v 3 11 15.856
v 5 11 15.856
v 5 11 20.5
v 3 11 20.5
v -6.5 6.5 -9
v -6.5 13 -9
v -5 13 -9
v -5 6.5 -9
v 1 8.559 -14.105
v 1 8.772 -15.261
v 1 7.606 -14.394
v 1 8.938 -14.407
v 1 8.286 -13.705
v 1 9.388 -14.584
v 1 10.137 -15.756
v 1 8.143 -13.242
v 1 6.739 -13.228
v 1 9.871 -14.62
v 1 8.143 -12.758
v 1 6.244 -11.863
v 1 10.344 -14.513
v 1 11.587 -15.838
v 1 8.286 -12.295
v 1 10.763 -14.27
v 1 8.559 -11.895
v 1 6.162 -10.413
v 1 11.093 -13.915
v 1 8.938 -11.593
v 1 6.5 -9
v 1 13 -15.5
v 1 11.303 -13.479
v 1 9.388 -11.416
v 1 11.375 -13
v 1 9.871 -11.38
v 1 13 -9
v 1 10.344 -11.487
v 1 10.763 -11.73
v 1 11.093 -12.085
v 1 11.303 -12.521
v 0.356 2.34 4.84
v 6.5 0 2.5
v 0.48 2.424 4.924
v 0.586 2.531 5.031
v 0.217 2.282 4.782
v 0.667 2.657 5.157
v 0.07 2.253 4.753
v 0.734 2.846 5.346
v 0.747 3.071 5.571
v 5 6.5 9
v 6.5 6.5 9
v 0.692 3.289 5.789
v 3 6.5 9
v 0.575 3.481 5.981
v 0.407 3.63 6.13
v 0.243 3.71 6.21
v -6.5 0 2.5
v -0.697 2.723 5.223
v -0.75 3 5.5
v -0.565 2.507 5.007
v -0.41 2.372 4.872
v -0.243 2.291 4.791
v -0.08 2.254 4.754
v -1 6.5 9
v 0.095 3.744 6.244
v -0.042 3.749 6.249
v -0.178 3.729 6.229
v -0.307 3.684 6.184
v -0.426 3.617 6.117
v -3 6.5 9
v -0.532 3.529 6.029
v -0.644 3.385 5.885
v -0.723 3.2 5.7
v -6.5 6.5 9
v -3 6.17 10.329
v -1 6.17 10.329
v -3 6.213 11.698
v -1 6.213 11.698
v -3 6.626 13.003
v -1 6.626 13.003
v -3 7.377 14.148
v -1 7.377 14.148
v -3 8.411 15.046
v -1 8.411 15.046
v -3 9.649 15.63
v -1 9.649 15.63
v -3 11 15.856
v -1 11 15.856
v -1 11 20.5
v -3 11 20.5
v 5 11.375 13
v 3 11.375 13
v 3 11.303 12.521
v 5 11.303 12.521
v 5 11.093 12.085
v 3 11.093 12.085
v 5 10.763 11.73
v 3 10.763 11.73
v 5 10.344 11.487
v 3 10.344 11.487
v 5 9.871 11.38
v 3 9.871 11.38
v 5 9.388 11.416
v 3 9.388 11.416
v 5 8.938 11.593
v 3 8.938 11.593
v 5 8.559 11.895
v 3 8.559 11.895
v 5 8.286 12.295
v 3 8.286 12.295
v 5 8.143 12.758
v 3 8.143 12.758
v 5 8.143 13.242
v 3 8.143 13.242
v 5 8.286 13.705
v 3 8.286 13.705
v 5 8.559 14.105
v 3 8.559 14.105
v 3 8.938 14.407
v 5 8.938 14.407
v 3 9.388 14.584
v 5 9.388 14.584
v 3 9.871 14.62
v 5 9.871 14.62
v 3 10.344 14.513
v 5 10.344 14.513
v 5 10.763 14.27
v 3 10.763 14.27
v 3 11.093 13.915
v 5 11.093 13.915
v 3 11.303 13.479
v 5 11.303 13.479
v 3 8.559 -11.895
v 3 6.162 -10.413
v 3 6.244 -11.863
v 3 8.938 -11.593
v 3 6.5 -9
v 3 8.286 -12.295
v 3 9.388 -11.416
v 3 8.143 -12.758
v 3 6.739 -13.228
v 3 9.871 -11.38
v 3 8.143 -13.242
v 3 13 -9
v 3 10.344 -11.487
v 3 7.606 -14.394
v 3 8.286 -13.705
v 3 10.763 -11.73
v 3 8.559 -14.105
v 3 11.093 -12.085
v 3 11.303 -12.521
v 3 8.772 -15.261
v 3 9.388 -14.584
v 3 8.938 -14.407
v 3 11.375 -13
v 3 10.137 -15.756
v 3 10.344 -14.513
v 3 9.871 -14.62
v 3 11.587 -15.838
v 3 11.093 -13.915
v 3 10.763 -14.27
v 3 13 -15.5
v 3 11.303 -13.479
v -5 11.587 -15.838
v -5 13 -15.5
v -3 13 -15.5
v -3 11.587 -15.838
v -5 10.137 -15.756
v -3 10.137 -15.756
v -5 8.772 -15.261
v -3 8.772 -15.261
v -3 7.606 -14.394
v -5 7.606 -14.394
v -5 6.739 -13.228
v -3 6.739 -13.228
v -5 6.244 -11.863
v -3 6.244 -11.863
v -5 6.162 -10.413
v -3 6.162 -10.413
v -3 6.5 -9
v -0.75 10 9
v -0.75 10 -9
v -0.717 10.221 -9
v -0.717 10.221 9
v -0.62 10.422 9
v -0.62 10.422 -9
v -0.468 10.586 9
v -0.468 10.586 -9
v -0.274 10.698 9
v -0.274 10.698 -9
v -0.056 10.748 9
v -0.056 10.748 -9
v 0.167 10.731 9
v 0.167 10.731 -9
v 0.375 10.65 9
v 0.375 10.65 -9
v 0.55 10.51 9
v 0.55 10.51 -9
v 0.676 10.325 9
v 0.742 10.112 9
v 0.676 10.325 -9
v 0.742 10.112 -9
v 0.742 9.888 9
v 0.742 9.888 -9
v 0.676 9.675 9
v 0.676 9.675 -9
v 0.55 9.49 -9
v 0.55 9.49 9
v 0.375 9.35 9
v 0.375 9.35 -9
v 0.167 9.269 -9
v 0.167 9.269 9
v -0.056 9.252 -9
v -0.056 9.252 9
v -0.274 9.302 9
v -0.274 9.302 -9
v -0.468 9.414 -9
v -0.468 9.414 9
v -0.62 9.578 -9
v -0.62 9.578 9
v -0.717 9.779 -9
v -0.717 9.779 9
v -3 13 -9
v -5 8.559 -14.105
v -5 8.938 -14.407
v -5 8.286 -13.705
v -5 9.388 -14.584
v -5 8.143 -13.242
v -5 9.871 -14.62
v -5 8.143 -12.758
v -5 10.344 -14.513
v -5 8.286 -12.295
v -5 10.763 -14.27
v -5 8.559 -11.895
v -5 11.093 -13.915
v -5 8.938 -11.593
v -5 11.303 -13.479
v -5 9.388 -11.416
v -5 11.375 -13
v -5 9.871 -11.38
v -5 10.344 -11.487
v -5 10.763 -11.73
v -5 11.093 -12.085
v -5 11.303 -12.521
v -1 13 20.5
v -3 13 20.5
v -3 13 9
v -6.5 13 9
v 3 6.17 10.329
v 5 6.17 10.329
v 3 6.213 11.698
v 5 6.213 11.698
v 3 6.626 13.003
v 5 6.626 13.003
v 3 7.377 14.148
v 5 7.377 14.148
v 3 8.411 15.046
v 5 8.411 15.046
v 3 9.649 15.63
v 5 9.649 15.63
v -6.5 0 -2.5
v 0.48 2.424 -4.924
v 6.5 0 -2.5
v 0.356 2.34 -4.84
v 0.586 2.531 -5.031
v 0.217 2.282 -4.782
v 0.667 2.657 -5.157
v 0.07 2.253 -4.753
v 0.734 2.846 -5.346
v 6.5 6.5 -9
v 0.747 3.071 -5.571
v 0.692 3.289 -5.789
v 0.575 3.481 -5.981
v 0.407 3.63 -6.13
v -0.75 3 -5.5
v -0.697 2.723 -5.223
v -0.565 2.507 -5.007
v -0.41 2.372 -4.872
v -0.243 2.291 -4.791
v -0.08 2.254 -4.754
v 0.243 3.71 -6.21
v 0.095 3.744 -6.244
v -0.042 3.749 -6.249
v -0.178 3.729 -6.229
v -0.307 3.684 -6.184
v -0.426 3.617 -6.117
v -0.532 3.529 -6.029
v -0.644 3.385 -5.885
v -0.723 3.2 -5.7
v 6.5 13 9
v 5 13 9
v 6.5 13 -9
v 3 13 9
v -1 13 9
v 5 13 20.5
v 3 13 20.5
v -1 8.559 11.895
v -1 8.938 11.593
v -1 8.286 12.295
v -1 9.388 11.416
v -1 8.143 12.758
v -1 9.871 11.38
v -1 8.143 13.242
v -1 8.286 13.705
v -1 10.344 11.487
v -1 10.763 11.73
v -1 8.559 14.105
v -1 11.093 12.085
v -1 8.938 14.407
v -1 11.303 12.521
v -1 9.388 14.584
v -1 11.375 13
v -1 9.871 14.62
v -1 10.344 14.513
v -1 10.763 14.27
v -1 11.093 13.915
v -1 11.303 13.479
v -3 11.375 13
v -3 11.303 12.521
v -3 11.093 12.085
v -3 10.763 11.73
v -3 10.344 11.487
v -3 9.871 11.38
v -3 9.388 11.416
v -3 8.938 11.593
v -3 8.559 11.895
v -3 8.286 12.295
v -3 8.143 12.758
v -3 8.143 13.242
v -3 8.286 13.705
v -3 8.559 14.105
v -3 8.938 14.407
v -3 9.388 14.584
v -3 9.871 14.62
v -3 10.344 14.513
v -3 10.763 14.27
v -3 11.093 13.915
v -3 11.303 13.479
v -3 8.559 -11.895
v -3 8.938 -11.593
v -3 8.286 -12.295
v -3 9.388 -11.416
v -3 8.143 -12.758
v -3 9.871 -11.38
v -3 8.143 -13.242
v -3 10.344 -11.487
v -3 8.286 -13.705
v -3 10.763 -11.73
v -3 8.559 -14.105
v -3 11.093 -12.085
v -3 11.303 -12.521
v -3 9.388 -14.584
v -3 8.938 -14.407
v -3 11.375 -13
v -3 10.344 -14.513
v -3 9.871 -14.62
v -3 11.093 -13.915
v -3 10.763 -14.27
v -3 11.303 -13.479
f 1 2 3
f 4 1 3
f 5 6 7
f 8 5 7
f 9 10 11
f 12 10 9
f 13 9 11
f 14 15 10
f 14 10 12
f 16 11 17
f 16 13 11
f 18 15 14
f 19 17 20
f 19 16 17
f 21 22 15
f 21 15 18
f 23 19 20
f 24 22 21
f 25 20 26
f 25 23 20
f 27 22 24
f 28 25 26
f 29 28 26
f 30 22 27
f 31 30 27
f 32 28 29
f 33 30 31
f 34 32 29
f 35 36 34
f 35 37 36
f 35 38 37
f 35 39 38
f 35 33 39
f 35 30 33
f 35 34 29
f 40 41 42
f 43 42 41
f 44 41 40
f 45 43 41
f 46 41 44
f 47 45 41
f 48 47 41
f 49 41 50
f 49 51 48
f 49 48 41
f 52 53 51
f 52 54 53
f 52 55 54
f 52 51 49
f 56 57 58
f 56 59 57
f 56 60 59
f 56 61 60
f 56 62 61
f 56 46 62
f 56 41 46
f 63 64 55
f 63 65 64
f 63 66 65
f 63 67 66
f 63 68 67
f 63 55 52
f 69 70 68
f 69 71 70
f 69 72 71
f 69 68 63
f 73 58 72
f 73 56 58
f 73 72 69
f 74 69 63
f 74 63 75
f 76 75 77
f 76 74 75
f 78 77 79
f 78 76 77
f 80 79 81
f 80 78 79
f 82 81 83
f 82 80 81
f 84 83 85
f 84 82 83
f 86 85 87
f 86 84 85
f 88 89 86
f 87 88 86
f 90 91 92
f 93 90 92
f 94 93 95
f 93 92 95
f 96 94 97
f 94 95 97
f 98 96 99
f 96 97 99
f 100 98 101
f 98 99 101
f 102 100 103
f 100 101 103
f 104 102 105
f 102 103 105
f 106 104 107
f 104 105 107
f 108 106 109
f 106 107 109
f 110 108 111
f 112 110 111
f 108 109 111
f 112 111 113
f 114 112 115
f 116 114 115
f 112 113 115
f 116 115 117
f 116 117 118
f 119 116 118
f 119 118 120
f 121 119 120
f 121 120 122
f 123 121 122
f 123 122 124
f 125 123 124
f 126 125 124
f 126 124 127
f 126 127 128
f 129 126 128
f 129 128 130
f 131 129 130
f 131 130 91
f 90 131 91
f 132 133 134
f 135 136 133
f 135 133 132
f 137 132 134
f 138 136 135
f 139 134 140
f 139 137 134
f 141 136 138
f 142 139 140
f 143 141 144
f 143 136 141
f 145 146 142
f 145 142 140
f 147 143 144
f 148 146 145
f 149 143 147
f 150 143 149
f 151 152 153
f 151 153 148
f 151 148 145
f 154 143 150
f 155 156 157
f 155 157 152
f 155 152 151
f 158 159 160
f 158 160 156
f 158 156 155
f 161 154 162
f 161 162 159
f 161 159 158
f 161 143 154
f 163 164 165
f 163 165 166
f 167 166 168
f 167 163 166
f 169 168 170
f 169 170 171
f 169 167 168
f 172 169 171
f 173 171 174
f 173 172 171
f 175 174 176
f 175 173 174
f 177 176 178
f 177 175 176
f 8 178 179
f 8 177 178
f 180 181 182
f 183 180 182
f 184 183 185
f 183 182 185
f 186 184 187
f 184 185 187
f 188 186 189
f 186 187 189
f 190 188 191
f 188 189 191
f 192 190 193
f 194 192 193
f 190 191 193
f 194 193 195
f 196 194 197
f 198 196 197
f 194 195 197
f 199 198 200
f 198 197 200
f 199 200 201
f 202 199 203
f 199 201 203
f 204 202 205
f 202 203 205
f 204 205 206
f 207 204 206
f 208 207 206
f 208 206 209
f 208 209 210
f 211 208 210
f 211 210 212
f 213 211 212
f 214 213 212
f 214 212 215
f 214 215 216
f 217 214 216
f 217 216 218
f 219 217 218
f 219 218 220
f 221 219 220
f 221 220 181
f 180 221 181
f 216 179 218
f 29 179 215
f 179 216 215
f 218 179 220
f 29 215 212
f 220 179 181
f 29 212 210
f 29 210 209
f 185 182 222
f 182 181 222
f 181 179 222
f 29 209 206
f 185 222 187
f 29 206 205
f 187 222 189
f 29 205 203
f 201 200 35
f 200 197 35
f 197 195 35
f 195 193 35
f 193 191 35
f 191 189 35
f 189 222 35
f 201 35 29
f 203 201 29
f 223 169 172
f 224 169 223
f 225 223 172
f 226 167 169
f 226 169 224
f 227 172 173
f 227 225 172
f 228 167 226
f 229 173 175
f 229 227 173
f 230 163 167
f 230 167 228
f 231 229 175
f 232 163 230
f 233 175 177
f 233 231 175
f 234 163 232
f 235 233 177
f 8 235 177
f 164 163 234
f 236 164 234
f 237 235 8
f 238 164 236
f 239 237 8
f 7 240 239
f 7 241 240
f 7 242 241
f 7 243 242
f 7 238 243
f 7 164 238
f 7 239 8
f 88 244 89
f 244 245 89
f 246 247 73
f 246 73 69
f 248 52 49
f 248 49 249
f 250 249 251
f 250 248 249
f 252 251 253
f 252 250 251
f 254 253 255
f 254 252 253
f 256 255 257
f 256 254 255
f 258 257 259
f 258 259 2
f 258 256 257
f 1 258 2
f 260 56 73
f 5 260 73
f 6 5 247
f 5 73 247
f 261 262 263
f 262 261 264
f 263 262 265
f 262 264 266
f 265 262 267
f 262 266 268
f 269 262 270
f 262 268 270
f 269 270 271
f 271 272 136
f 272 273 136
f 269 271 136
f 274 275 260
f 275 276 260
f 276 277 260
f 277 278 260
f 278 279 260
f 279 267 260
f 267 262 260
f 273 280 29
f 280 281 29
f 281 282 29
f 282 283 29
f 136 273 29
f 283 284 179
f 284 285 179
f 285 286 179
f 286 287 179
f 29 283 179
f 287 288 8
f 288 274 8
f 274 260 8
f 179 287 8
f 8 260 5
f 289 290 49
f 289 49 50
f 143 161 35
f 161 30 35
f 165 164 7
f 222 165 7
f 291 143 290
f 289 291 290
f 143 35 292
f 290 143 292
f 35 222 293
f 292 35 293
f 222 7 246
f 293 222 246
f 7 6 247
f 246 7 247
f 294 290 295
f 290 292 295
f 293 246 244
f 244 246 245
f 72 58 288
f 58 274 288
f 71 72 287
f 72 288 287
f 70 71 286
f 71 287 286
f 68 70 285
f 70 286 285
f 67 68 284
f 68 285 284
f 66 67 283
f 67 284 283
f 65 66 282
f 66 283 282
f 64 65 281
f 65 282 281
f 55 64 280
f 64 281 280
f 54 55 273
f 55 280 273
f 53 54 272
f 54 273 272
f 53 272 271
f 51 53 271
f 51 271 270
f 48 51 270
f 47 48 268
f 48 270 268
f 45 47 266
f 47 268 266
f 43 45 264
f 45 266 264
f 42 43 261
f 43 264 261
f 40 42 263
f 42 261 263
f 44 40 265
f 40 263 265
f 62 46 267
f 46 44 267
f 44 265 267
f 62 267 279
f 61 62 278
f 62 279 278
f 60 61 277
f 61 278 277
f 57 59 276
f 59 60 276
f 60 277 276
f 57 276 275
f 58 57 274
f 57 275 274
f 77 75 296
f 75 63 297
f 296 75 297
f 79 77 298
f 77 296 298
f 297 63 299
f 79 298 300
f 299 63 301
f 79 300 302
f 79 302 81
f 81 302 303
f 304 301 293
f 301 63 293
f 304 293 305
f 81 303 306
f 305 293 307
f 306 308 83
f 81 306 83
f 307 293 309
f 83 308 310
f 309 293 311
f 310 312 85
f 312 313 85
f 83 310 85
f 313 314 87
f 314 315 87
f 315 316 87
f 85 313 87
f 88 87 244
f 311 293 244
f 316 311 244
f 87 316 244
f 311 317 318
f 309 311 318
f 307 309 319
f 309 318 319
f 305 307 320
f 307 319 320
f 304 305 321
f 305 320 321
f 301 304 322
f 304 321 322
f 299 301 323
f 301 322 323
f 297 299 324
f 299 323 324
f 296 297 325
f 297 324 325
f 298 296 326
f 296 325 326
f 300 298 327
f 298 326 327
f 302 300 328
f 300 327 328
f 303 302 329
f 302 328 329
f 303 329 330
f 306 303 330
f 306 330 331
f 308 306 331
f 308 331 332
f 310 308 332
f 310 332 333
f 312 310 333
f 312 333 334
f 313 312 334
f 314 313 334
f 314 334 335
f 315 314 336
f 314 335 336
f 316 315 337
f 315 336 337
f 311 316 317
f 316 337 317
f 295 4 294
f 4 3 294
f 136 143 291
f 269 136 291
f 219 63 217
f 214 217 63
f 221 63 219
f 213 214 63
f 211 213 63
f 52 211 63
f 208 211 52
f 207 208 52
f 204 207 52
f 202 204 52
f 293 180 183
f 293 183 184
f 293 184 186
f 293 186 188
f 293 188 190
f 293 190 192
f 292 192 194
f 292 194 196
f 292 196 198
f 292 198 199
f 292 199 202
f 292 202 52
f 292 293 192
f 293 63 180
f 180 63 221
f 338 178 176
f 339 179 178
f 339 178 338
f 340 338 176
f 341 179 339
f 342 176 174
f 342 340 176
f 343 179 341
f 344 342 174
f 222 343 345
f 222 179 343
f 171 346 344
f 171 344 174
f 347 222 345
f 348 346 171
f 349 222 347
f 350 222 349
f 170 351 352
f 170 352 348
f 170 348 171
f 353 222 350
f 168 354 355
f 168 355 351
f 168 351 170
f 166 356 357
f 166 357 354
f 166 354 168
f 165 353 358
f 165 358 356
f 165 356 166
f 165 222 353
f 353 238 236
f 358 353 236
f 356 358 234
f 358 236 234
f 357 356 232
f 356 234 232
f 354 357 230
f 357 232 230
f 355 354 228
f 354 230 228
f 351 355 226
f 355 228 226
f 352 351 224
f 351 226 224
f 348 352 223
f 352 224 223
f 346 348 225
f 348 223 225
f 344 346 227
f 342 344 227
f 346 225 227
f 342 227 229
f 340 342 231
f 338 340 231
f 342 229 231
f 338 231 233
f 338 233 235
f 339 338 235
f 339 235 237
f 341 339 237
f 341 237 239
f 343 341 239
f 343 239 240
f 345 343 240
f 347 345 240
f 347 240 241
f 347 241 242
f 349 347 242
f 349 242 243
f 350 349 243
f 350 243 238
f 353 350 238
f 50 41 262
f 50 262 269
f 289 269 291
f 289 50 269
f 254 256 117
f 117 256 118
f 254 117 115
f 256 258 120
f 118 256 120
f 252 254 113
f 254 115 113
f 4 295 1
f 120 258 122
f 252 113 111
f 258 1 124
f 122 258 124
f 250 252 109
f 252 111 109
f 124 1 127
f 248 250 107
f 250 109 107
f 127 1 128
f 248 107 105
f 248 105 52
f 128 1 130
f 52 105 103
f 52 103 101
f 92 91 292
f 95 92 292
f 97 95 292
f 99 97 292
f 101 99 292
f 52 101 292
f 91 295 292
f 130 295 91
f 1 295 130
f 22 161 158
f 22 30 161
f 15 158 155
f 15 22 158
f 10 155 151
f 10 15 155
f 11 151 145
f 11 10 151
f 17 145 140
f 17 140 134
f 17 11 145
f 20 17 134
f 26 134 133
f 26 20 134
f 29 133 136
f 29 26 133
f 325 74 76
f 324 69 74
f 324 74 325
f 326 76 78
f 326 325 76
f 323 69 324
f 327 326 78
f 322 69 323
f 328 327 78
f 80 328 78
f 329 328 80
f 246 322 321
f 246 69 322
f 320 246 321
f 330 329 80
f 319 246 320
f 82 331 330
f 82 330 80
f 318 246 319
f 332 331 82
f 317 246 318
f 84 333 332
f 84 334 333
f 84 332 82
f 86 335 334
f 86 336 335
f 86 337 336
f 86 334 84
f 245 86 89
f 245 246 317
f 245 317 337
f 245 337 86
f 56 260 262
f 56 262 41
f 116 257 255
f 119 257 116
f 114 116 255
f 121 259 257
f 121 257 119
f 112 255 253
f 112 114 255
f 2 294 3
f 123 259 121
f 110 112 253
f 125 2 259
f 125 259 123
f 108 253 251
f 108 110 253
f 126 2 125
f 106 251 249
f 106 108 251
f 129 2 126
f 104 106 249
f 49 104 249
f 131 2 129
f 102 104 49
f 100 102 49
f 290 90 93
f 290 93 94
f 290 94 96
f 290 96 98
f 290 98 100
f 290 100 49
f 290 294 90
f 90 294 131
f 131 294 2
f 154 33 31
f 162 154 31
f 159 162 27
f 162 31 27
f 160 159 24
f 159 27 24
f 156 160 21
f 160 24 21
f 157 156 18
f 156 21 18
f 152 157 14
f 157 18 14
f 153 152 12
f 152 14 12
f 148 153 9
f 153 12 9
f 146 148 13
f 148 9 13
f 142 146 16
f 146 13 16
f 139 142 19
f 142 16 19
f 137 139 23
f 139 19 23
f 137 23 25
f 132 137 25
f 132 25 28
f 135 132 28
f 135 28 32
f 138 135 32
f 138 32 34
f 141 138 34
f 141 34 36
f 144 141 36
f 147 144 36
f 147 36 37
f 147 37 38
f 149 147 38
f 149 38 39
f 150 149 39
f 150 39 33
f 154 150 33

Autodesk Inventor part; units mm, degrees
ref_plane "YZ Plane" through (0, 0, 0) normal (1, 0, 0) x (0, 1, 0)
ref_plane "XZ Plane" through (0, 0, 0) normal (0, 1, 0) x (-1, 0, 0)
ref_plane "XY Plane" through (0, 0, 0) normal (0, 0, 1) x (1, 0, 0)
sketch "Sketch7" plane through (0, 0, 0) normal (1, 0, 0) x (0, 1, 0)
  line L0 (-2.6, 0) -> (15.6, 0) projected
  line L1 (0, -24.701) -> (0, 24.701) projected
  line L2 (0, 2.5) -> (0, -2.5)
  line L3 (13, 15.5) -> (13, 0)
  line L4 (0, 2.5) -> (6.5, 9)
  line L5 (0, 2.5) -> (9.1924, 2.5) construction
  arc A0 (13, 15.5) -> (6.5, 9) centre (11.1419, 10.8581) ccw
  circle A1 centre (9.75, 13) radius 1.625
  line L6 (13, -15.5) -> (13, 0)
  line L7 (0, -2.5) -> (6.5, -9)
  arc A2 (6.5, -9) -> (13, -15.5) centre (11.1419, -10.8581) ccw
  circle A3 centre (9.75, -13) radius 1.625
  point P0 (0, 0)
  dimension "d64" = 5
  dimension "d65" = 2.5
  dimension "d66" = 45
  dimension "d67" = 6.5
  dimension "d68" = 13
  dimension "d69" = 15.5
  dimension "d70" = 5
  dimension "d71" = 3.25
  dimension "d74" = 3.25
  dimension "d103" = 2.5
extrude "Extrusion5" add sketch "Sketch7" along normal mid plane 13
sketch "Sketch8" plane through (-6.5, 13, 15.5) normal (0, 1, 0) x (1, 0, 0)
  line L0 (0, 6.5) -> (13, 6.5) projected
  line L1 (11.5, 6.5) -> (13, 6.5)
  line L2 (13, 6.5) -> (13, -0.5)
  line L3 (13, -0.5) -> (11.5, -0.5)
  line L4 (11.5, -0.5) -> (11.5, 6.5)
  line L5 (13, 31) -> (13, 0) projected
  line L6 (5.5, 6.5) -> (9.5, 6.5)
  line L7 (9.5, 6.5) -> (9.5, -0.5)
  line L8 (9.5, -0.5) -> (5.5, -0.5)
  line L9 (5.5, -0.5) -> (5.5, 6.5)
  line L10 (0, 6.5) -> (3.5, 6.5)
  line L11 (3.5, 6.5) -> (3.5, -0.5)
  line L12 (3.5, -0.5) -> (0, -0.5)
  line L13 (0, -0.5) -> (0, 6.5)
  line L14 (0, 0) -> (0, 31) projected
  point P0 (6.5, 15.5)
  dimension "d77" = 1.5
  dimension "d78" = 7
  dimension "d79" = 4
  dimension "d80" = 7
  dimension "d81" = 2
  dimension "d83" = 7
  dimension "d101" = 2
extrude "Extrusion6" cut sketch "Sketch8" against normal blind 10
sketch "Sketch9" plane through (-6.5, 13, -15.5) normal (0, 1, 0) x (1, 0, 0)
  line L0 (0, -6.5) -> (13, -6.5) projected
  line L1 (1.5, -6.5) -> (0, -6.5)
  line L2 (0, -6.5) -> (0, 0.5)
  line L3 (0, 0.5) -> (1.5, 0.5)
  line L4 (1.5, 0.5) -> (1.5, -6.5)
  line L5 (0, -24.5) -> (0, 0) projected
  line L6 (7.5, -6.5) -> (3.5, -6.5)
  line L7 (3.5, -6.5) -> (3.5, 0.5)
  line L8 (3.5, 0.5) -> (7.5, 0.5)
  line L9 (7.5, 0.5) -> (7.5, -6.5)
  line L10 (13, -6.5) -> (9.5, -6.5)
  line L11 (9.5, -6.5) -> (9.5, 0.5)
  line L12 (9.5, 0.5) -> (13, 0.5)
  line L13 (13, 0.5) -> (13, -6.5)
  line L14 (13, 0) -> (13, -24.5) projected
  point P0 (6.5, -15.5)
  dimension "d86" = 1.5
  dimension "d87" = 7
  dimension "d88" = 4
  dimension "d89" = 7
  dimension "d90" = 2
  dimension "d92" = 7
  dimension "d102" = 2
extrude "Extrusion7" cut sketch "Sketch9" against normal blind 10
sketch "Sketch10" plane through (1, 13, -9) normal (0, 0, -1) x (-1, 0, 0)
  line L0 (1, -15.6) -> (1, 2.6) projected
  line L1 (7.5, -13) -> (-5.5, -13) projected
  circle A0 centre (1, -3) radius 0.75
  line L2 (0, 0) -> (4, 0) projected
  circle A1 centre (1, -10) radius 0.75
  point P0 (1, -13)
  dimension "d95" = 1.5
  dimension "d96" = 3
  dimension "d97" = 1.5
  dimension "d98" = 3
extrude "Extrusion8" cut sketch "Sketch10" against normal blind 20
sketch "Sketch13" plane through (5, 13, 15.5) normal (1, 0, 0) x (0, 0, -1)
  line L0 (-5, 0) -> (0, 0)
  line L1 (0, 0) -> (0, -2)
  line L2 (0, -2) -> (-5, -2)
  line L3 (-5, -2) -> (-5, 0)
  line L4 (0, 0) -> (6.5, 0) projected
  point P0 (15.5, -13)
  dimension "d112" = 5
  dimension "d113" = 2
extrude "Extrusion11" add sketch "Sketch13" against normal blind 2
sketch "Sketch14" plane through (-3, 13, 9) normal (-1, 0, 0) x (0, 0, 1)
  line L0 (6.5, 0) -> (0, 0) projected
  line L1 (6.5, 0) -> (11.5, 0)
  line L2 (11.5, 0) -> (11.5, -2)
  line L3 (11.5, -2) -> (6.5, -2)
  line L4 (6.5, -2) -> (6.5, 0)
  point P0 (-9, -13)
  dimension "d116" = 5
  dimension "d117" = 2
extrude "Extrusion12" add sketch "Sketch14" against normal blind 2
properties part number "finger_joins"
